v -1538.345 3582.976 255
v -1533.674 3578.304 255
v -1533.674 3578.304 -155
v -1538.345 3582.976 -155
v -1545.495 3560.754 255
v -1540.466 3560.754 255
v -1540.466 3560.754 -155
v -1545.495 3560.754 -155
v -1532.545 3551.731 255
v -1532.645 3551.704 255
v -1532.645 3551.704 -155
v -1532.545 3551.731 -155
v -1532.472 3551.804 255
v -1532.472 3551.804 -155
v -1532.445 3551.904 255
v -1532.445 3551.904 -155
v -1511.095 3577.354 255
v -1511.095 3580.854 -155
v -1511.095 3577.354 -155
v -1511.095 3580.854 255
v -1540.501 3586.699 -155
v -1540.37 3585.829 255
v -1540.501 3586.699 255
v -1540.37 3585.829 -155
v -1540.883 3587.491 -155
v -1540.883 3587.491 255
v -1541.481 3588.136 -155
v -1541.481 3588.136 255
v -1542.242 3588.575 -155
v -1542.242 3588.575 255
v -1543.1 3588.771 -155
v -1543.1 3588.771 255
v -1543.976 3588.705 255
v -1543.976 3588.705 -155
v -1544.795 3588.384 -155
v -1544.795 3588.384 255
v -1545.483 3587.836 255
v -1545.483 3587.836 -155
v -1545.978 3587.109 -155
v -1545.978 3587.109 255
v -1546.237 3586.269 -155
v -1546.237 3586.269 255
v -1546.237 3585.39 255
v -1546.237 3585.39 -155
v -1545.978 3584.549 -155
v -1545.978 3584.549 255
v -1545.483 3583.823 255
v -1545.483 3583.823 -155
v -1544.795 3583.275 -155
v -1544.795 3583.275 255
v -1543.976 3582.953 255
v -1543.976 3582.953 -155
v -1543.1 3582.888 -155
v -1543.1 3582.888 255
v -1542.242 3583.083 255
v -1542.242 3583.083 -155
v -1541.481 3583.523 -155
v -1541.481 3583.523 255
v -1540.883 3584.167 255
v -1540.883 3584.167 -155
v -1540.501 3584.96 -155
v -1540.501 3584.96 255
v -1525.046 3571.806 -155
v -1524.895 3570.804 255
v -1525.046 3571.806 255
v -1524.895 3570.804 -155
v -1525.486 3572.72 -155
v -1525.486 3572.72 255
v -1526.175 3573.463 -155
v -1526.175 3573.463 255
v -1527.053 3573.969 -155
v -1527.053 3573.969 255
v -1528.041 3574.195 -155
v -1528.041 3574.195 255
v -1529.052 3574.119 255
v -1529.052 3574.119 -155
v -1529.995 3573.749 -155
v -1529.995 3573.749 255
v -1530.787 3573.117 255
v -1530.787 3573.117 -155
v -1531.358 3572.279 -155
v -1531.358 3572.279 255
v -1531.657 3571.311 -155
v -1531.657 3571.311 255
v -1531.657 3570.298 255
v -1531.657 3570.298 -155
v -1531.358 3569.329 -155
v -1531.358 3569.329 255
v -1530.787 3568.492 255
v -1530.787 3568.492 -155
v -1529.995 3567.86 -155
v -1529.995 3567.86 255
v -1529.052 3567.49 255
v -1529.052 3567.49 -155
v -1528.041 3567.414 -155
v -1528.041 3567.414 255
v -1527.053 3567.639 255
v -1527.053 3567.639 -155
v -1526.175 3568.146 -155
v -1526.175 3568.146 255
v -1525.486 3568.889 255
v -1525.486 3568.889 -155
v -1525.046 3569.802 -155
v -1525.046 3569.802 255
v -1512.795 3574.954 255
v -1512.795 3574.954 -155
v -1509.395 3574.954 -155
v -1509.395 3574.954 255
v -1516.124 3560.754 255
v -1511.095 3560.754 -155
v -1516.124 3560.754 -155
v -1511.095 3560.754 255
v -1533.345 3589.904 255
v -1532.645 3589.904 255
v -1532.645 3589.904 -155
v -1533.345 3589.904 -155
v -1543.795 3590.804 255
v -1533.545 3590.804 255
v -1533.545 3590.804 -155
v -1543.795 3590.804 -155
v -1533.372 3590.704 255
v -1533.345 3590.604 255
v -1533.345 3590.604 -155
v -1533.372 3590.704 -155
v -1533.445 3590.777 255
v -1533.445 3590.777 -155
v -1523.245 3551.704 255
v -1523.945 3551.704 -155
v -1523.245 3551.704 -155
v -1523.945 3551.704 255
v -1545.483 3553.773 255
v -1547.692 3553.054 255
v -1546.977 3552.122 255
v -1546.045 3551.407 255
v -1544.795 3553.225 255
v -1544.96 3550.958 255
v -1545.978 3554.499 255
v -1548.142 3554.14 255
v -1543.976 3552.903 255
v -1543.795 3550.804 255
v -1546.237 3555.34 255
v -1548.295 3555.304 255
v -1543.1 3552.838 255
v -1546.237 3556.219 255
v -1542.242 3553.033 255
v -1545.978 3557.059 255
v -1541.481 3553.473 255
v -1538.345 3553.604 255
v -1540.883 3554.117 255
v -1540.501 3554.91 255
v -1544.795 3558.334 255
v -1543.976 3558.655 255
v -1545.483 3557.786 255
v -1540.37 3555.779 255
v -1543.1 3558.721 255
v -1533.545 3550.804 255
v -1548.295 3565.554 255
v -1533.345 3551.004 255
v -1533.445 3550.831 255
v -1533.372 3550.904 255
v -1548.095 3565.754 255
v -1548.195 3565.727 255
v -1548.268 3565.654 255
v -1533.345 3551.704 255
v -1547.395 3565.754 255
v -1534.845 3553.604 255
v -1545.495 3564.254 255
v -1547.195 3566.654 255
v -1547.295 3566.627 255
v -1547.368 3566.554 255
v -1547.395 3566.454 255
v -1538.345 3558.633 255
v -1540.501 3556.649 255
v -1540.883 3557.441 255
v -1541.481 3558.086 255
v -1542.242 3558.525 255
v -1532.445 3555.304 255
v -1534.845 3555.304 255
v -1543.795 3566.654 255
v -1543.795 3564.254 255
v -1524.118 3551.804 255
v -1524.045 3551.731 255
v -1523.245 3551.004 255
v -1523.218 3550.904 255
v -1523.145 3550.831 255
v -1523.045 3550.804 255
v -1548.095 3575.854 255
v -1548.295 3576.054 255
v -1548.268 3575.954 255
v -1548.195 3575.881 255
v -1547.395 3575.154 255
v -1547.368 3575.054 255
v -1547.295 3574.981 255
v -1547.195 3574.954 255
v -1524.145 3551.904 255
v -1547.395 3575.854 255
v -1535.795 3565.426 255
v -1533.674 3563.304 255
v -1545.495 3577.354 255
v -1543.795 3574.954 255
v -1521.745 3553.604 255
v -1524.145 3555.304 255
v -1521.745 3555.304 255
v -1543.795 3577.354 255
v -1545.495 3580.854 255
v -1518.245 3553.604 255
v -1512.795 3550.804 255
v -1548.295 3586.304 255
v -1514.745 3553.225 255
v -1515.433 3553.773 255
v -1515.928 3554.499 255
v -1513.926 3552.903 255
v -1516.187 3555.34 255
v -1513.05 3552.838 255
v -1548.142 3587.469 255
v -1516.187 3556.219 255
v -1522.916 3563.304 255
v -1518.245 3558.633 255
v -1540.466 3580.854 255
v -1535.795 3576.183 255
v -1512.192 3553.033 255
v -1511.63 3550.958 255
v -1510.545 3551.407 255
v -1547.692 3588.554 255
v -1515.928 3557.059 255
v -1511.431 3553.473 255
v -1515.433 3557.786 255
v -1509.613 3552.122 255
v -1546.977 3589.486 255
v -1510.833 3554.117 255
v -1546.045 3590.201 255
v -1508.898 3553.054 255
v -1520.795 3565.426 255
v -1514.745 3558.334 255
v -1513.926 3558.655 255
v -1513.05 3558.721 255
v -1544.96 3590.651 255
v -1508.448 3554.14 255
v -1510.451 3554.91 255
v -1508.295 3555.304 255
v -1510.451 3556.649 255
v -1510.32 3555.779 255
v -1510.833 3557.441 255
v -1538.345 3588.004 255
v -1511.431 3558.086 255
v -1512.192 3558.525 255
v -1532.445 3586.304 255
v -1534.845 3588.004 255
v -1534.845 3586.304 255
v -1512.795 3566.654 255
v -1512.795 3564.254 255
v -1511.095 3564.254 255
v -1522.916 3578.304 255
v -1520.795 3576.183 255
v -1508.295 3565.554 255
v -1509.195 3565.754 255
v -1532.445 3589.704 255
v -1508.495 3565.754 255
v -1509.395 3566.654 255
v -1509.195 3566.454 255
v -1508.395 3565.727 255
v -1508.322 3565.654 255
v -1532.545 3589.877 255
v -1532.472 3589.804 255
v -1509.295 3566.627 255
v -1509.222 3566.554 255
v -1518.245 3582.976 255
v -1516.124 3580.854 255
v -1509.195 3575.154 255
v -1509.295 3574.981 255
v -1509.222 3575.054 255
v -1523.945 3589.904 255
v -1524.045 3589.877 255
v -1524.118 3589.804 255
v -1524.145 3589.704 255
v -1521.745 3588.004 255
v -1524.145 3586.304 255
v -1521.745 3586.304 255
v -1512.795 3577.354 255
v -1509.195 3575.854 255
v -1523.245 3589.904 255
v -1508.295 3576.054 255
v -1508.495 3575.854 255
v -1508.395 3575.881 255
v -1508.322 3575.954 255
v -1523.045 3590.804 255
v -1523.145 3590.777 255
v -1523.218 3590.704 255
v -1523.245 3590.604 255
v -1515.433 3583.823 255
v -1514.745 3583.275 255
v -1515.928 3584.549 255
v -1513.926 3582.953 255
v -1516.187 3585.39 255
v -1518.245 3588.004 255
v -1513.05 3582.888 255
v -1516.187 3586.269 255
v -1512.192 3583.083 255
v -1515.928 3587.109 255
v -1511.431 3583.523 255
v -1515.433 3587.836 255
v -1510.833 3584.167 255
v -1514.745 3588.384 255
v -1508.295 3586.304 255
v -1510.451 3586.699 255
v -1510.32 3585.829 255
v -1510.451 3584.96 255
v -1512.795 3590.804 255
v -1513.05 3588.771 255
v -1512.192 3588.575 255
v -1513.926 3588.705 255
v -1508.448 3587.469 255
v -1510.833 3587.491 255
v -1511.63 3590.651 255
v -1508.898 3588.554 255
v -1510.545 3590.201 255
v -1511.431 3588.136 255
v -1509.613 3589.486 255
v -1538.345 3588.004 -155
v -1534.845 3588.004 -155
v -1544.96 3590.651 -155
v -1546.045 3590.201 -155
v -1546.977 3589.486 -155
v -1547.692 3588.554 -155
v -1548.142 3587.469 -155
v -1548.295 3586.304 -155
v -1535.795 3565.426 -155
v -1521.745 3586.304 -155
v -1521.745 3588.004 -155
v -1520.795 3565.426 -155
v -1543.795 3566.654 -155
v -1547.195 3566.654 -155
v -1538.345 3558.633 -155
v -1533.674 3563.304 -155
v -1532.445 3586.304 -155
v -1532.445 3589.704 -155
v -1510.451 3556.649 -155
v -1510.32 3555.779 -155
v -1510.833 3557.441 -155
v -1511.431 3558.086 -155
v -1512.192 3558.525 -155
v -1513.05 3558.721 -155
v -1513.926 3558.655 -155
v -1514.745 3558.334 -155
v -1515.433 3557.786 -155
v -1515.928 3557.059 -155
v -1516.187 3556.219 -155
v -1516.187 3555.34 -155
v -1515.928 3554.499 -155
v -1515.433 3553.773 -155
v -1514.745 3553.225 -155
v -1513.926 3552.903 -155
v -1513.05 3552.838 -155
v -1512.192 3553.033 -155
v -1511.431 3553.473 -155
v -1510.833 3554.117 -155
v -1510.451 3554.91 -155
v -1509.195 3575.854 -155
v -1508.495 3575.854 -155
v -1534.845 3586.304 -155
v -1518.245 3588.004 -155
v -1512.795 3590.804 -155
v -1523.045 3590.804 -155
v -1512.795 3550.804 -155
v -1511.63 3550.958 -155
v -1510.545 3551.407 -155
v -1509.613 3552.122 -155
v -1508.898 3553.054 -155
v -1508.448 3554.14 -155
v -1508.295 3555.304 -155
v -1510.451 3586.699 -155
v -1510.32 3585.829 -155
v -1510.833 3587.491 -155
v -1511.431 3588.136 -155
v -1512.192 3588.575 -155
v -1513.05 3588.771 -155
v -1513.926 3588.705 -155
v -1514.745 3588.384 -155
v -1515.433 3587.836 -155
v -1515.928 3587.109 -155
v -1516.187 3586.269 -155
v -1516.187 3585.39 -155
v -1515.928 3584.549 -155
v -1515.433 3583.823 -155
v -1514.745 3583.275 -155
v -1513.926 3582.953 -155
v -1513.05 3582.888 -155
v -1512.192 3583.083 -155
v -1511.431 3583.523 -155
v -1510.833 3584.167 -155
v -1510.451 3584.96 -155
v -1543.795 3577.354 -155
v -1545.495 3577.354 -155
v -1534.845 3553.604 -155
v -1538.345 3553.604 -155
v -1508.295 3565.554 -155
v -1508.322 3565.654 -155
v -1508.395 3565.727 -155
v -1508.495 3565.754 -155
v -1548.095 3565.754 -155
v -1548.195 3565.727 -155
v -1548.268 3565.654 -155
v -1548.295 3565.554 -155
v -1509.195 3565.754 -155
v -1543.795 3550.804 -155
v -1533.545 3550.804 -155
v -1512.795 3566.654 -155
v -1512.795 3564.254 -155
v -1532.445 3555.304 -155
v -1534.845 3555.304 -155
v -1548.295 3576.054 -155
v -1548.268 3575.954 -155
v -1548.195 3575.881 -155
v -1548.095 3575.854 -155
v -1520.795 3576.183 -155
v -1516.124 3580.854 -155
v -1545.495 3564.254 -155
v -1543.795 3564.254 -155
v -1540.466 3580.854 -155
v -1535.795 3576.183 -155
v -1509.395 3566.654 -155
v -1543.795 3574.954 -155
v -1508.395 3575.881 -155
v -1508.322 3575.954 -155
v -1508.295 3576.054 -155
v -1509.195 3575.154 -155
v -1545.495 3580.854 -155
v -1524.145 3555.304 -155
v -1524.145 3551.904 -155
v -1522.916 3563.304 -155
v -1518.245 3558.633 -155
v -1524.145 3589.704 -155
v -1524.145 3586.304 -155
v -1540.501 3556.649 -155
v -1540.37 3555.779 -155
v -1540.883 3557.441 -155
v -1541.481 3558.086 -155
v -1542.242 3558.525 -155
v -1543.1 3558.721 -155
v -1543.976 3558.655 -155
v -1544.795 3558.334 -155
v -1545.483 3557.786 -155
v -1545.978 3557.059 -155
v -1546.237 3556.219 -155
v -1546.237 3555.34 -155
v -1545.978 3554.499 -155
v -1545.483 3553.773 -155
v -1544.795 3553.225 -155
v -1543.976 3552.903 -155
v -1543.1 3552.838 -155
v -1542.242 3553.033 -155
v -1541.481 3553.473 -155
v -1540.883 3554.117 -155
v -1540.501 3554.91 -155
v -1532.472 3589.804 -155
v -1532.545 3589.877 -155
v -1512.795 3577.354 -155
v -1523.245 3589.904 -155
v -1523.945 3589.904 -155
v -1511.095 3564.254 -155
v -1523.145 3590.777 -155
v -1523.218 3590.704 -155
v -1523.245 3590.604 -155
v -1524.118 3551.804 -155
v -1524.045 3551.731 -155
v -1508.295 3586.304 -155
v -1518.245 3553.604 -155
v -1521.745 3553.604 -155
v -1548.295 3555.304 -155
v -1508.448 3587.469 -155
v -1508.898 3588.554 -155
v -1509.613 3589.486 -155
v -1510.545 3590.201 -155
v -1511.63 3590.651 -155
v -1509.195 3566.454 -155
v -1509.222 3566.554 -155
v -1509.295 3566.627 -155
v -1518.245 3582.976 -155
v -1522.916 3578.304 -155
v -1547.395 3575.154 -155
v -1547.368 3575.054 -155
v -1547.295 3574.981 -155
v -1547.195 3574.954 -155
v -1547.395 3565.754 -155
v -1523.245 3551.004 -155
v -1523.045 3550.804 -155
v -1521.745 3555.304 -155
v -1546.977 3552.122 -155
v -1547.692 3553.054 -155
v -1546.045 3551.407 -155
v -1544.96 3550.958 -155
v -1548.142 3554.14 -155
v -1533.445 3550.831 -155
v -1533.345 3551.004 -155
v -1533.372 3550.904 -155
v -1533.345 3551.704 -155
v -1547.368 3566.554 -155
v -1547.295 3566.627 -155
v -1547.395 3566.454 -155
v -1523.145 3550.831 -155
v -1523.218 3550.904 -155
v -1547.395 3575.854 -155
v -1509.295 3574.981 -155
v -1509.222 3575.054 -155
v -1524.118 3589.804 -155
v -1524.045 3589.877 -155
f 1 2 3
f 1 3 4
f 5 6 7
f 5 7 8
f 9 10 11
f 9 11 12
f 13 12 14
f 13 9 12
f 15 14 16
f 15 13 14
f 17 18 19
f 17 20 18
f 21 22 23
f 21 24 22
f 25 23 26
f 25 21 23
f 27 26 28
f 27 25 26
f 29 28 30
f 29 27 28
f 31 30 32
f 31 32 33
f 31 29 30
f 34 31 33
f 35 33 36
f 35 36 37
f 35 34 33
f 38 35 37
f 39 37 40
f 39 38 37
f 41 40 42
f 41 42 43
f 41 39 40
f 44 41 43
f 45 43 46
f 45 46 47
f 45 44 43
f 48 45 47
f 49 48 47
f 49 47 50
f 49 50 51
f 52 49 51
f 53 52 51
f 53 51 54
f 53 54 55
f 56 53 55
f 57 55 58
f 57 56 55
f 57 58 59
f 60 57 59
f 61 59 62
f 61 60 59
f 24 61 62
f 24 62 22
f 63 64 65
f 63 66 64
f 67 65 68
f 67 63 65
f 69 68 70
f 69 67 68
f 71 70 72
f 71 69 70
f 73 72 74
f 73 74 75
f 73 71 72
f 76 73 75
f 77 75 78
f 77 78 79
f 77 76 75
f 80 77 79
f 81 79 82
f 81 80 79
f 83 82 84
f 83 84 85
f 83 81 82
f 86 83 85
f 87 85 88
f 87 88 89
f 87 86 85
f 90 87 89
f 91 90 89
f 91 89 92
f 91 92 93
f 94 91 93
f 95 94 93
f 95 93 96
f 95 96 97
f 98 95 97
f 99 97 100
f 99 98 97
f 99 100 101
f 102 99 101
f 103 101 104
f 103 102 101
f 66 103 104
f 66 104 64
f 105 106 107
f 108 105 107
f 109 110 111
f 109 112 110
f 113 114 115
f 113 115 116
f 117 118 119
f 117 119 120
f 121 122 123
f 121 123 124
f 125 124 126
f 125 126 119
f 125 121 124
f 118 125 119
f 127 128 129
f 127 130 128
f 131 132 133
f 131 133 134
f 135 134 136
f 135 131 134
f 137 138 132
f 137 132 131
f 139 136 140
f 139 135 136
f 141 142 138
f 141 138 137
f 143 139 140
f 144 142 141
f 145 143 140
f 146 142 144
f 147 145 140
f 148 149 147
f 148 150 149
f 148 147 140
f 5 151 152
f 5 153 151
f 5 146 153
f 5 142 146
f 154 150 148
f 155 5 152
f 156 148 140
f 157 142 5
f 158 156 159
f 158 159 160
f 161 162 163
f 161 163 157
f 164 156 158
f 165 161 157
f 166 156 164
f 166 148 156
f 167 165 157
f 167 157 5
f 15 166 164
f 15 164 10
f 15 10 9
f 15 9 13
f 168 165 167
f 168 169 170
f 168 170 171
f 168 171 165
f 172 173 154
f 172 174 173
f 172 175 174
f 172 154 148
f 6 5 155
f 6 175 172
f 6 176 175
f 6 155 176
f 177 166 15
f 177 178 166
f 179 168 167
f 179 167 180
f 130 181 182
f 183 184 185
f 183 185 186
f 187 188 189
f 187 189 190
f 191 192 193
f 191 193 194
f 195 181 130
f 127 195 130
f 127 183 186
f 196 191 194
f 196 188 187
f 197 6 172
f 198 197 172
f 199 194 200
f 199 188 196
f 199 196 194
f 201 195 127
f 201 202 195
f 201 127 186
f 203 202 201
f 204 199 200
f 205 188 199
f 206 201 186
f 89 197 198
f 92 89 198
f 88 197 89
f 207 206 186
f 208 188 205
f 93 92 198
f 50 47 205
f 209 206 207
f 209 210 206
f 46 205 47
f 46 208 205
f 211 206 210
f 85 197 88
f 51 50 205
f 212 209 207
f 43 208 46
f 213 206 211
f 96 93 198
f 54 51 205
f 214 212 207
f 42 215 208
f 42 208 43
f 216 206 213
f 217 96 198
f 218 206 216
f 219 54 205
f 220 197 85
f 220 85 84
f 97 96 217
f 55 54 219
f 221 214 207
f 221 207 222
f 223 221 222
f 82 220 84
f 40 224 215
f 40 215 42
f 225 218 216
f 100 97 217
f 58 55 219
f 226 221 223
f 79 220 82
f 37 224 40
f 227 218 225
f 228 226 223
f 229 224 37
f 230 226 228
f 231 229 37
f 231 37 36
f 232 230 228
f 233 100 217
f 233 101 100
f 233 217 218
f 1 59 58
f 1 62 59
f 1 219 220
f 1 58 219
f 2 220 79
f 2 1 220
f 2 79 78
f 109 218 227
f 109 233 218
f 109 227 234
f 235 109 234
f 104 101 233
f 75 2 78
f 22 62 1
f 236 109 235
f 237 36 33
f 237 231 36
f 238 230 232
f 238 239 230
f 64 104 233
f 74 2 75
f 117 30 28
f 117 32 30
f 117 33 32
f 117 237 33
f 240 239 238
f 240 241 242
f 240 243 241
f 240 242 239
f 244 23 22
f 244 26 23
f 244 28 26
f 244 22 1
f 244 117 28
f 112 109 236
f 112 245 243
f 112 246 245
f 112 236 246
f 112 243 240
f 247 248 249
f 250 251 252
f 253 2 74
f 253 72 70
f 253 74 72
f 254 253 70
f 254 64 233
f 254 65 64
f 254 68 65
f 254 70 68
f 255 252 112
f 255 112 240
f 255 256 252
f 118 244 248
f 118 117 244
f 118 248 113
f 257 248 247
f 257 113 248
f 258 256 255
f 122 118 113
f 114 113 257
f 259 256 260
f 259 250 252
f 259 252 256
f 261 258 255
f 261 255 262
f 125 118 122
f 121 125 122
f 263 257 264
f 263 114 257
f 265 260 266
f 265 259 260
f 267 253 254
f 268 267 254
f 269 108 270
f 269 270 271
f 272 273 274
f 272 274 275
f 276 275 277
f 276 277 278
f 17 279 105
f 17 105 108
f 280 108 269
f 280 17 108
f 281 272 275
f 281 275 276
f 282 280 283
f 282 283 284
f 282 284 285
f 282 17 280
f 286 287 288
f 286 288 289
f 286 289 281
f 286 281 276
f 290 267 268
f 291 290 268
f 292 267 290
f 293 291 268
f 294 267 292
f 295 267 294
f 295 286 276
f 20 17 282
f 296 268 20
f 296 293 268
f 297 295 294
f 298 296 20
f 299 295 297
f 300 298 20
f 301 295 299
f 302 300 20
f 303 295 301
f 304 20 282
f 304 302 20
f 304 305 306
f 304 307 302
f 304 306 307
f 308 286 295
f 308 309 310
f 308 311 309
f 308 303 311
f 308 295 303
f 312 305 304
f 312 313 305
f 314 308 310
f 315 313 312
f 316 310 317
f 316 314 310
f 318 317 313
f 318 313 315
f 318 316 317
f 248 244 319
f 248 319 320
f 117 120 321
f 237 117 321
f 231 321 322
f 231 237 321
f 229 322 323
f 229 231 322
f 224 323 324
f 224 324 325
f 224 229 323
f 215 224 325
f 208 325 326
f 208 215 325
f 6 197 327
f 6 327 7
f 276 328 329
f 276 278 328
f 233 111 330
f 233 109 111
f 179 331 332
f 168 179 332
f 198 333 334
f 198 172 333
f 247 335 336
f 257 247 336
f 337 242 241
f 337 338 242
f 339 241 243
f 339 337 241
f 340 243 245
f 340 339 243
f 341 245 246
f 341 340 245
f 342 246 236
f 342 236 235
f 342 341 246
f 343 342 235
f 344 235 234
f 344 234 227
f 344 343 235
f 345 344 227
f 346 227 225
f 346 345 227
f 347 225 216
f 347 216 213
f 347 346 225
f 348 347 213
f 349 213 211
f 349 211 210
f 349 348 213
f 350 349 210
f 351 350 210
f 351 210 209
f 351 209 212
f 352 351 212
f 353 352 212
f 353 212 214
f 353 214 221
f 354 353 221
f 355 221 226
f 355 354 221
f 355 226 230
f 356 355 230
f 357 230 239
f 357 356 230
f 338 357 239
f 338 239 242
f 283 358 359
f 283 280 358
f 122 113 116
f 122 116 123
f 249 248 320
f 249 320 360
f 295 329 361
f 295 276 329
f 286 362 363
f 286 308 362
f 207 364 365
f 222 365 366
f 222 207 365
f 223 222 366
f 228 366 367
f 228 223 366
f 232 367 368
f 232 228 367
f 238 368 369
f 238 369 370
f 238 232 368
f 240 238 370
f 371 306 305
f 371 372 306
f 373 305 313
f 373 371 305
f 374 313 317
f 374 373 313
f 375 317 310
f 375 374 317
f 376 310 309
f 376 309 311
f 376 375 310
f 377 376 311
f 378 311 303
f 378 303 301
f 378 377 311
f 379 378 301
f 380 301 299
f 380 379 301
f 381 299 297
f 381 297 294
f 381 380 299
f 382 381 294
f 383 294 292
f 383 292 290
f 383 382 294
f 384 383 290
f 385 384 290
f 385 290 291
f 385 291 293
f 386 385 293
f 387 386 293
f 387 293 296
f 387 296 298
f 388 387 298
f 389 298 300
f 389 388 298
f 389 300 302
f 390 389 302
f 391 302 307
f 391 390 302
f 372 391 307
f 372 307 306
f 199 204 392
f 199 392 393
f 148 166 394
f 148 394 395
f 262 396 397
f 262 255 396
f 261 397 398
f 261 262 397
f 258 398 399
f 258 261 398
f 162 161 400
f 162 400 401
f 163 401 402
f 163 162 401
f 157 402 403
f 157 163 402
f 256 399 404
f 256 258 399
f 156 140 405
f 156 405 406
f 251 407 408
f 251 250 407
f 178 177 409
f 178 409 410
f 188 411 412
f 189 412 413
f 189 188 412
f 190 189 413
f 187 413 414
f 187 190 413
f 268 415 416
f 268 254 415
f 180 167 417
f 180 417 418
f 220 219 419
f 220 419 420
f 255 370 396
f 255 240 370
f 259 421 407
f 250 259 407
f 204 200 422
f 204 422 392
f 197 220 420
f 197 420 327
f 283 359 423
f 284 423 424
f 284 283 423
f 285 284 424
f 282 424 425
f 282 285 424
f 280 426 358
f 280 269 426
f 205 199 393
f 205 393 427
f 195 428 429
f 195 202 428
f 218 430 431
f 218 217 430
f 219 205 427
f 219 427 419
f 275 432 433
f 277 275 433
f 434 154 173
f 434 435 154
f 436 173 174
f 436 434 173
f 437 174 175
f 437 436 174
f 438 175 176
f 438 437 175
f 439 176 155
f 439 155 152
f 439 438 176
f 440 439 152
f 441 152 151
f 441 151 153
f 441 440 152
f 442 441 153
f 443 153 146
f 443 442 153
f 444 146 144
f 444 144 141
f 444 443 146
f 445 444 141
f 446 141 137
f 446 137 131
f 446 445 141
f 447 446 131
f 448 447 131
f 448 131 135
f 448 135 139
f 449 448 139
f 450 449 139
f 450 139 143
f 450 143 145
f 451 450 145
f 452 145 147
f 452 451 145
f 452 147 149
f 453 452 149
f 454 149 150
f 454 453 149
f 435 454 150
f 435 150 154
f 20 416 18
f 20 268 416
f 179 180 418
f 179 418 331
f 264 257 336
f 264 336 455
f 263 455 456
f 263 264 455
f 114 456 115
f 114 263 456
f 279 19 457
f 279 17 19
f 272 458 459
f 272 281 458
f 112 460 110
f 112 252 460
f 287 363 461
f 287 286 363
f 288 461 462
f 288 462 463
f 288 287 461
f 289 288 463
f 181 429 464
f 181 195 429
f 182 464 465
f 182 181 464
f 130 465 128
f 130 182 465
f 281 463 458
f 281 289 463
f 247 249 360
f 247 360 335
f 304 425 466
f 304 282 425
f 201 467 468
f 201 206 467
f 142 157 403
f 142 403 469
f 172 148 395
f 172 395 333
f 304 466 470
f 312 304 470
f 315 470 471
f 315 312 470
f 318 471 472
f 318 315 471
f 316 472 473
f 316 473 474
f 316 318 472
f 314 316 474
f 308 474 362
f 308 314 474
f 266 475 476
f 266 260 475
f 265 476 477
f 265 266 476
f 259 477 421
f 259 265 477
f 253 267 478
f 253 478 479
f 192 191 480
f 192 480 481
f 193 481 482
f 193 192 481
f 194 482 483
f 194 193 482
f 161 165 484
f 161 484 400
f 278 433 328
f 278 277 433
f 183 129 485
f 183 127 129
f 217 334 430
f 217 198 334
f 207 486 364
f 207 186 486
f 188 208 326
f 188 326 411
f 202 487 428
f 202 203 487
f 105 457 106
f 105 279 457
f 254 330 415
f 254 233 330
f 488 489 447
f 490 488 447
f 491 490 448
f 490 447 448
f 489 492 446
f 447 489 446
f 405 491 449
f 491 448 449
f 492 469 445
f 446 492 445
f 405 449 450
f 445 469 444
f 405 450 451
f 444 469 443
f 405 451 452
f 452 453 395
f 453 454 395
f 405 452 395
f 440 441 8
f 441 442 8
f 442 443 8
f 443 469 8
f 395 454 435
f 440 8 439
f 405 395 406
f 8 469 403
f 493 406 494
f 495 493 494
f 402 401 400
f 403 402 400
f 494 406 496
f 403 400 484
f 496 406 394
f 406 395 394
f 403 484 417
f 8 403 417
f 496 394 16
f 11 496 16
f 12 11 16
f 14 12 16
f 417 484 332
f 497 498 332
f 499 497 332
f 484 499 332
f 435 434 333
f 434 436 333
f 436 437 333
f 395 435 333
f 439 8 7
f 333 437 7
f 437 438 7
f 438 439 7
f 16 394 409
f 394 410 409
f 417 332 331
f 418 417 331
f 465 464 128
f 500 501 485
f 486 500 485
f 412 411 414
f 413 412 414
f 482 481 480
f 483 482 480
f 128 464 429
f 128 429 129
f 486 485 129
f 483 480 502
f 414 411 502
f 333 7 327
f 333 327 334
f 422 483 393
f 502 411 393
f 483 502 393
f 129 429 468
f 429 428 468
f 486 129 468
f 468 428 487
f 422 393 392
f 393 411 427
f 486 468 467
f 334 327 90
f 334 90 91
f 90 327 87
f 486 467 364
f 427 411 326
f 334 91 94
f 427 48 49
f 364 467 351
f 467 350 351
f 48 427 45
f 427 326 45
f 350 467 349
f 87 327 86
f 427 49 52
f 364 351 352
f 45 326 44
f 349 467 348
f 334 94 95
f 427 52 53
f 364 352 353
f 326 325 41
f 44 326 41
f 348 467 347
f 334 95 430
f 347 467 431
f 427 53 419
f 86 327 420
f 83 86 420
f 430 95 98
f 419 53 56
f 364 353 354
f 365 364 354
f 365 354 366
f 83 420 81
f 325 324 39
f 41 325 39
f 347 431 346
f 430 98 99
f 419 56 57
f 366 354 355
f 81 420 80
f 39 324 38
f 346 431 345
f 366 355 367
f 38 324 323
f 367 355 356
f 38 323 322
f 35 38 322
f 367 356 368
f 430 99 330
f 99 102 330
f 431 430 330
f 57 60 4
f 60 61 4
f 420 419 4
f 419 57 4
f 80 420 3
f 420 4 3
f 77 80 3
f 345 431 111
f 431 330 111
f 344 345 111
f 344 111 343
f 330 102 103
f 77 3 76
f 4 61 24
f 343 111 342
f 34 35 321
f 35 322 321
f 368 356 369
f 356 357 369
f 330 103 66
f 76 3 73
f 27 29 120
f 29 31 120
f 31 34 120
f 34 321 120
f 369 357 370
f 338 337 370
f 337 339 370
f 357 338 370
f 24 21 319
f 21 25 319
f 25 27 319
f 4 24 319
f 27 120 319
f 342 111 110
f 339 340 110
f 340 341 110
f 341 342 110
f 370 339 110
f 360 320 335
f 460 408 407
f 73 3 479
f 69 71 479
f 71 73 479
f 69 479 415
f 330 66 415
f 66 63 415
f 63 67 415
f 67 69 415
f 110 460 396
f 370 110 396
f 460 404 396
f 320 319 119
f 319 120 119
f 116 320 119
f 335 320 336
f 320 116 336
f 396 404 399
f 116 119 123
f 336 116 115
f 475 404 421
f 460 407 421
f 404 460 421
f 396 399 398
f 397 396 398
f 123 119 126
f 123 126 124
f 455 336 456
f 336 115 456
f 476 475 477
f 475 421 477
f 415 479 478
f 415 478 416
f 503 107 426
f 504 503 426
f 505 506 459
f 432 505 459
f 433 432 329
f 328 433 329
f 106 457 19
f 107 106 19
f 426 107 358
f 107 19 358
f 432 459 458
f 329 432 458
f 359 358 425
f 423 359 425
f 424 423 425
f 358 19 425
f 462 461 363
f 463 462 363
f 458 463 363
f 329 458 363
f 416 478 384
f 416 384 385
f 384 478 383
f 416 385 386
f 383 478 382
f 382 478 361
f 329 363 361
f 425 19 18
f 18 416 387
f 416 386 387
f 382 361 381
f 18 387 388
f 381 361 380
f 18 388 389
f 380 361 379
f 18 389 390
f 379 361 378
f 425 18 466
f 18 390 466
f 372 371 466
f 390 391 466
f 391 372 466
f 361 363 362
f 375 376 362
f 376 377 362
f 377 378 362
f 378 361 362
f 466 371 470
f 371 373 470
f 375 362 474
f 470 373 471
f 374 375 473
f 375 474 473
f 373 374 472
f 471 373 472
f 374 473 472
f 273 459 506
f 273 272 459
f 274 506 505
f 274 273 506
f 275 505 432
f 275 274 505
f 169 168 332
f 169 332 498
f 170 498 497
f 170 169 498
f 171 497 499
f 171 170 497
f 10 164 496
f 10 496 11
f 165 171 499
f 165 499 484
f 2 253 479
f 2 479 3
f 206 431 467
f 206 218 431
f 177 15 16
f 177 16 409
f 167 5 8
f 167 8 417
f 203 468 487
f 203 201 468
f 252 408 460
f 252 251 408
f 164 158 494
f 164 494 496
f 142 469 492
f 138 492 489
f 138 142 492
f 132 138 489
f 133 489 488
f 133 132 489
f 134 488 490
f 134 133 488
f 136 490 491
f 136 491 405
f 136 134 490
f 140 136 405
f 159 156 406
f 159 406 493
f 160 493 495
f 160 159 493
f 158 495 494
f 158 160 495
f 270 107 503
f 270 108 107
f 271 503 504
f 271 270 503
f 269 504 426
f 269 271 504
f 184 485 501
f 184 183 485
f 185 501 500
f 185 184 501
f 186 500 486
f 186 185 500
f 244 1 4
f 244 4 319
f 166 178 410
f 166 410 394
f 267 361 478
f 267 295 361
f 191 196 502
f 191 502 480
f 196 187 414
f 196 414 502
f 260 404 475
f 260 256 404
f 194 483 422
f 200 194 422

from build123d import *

# Parameters (mm, degrees)
SKETCH_1_R      = 2.95
SKETCH_1_R_2    = 3.4
EXTRUDE_1_DEPTH = 205


with BuildPart() as part:
    # 草图1 → 凸台-拉伸1 (new body, symmetric)
    with BuildSketch(Plane.XY.offset(50)):
        with BuildLine():
            Line((-1518.245004392, 3588.004280474), (-1518.245004392, 3582.975600817))
            Line((-1518.245004392, 3582.975600817), (-1522.916324736, 3578.304280474))
            Line((-1522.916324736, 3578.304280474), (-1533.673684048, 3578.304280474))
            Line((-1533.673684048, 3578.304280474), (-1538.345004392, 3582.975600817))
            Line((-1538.345004392, 3582.975600817), (-1538.345004392, 3588.004280474))
            Line((-1538.345004392, 3588.004280474), (-1534.845004392, 3588.004280474))
            Line((-1534.845004392, 3588.004280474), (-1534.845004392, 3586.304280474))
            Line((-1534.845004392, 3586.304280474), (-1532.445004392, 3586.304280474))
            Line((-1532.445004392, 3586.304280474), (-1532.445004392, 3589.704280474))
            ThreePointArc((-1532.445004392, 3589.704280474), (-1532.503583036, 3589.84570183), (-1532.645004392, 3589.904280474))
            Line((-1532.645004392, 3589.904280474), (-1533.345004392, 3589.904280474))
            Line((-1533.345004392, 3589.904280474), (-1533.345004392, 3590.604280474))
            ThreePointArc((-1533.345004392, 3590.604280474), (-1533.403583036, 3590.74570183), (-1533.545004392, 3590.804280474))
            Line((-1533.545004392, 3590.804280474), (-1543.795004392, 3590.804280474))
            ThreePointArc((-1543.795004392, 3590.804280474), (-1546.976984907, 3589.486260989), (-1548.295004392, 3586.304280474))
            Line((-1548.295004392, 3586.304280474), (-1548.295004392, 3576.054280474))
            ThreePointArc((-1548.295004392, 3576.054280474), (-1548.236425748, 3575.912859117), (-1548.095004392, 3575.854280474))
            Line((-1548.095004392, 3575.854280474), (-1547.395004392, 3575.854280474))
            Line((-1547.395004392, 3575.854280474), (-1547.395004392, 3575.154280474))
            ThreePointArc((-1547.395004392, 3575.154280474), (-1547.336425748, 3575.012859117), (-1547.195004392, 3574.954280474))
            Line((-1547.195004392, 3574.954280474), (-1543.795004392, 3574.954280474))
            Line((-1543.795004392, 3574.954280474), (-1543.795004392, 3577.354280474))
            Line((-1543.795004392, 3577.354280474), (-1545.495004392, 3577.354280474))
            Line((-1545.495004392, 3577.354280474), (-1545.495004392, 3580.854280474))
            Line((-1545.495004392, 3580.854280474), (-1540.466324736, 3580.854280474))
            Line((-1540.466324736, 3580.854280474), (-1535.795004392, 3576.18296013))
            Line((-1535.795004392, 3576.18296013), (-1535.795004392, 3565.425600817))
            Line((-1535.795004392, 3565.425600817), (-1540.466324736, 3560.754280474))
            Line((-1540.466324736, 3560.754280474), (-1545.495004392, 3560.754280474))
            Line((-1545.495004392, 3560.754280474), (-1545.495004392, 3564.254280474))
            Line((-1545.495004392, 3564.254280474), (-1543.795004392, 3564.254280474))
            Line((-1543.795004392, 3564.254280474), (-1543.795004392, 3566.654280474))
            Line((-1543.795004392, 3566.654280474), (-1547.195004392, 3566.654280474))
            ThreePointArc((-1547.195004392, 3566.654280474), (-1547.336425748, 3566.59570183), (-1547.395004392, 3566.454280474))
            Line((-1547.395004392, 3566.454280474), (-1547.395004392, 3565.754280474))
            Line((-1547.395004392, 3565.754280474), (-1548.095004392, 3565.754280474))
            ThreePointArc((-1548.095004392, 3565.754280474), (-1548.236425748, 3565.69570183), (-1548.295004392, 3565.554280474))
            Line((-1548.295004392, 3565.554280474), (-1548.295004392, 3555.304280474))
            ThreePointArc((-1548.295004392, 3555.304280474), (-1546.976984907, 3552.122299958), (-1543.795004392, 3550.804280474))
            Line((-1543.795004392, 3550.804280474), (-1533.545004392, 3550.804280474))
            ThreePointArc((-1533.545004392, 3550.804280474), (-1533.403583036, 3550.862859117), (-1533.345004392, 3551.004280474))
            Line((-1533.345004392, 3551.004280474), (-1533.345004392, 3551.704280474))
            Line((-1533.345004392, 3551.704280474), (-1532.645004392, 3551.704280474))
            ThreePointArc((-1532.645004392, 3551.704280474), (-1532.503583036, 3551.762859117), (-1532.445004392, 3551.904280474))
            Line((-1532.445004392, 3551.904280474), (-1532.445004392, 3555.304280474))
            Line((-1532.445004392, 3555.304280474), (-1534.845004392, 3555.304280474))
            Line((-1534.845004392, 3555.304280474), (-1534.845004392, 3553.604280474))
            Line((-1534.845004392, 3553.604280474), (-1538.345004392, 3553.604280474))
            Line((-1538.345004392, 3553.604280474), (-1538.345004392, 3558.63296013))
            Line((-1538.345004392, 3558.63296013), (-1533.673684048, 3563.304280474))
            Line((-1533.673684048, 3563.304280474), (-1522.916324736, 3563.304280474))
            Line((-1522.916324736, 3563.304280474), (-1518.245004392, 3558.63296013))
            Line((-1518.245004392, 3558.63296013), (-1518.245004392, 3553.604280474))
            Line((-1518.245004392, 3553.604280474), (-1521.745004392, 3553.604280474))
            Line((-1521.745004392, 3553.604280474), (-1521.745004392, 3555.304280474))
            Line((-1521.745004392, 3555.304280474), (-1524.145004392, 3555.304280474))
            Line((-1524.145004392, 3555.304280474), (-1524.145004392, 3551.904280474))
            ThreePointArc((-1524.145004392, 3551.904280474), (-1524.086425748, 3551.762859117), (-1523.945004392, 3551.704280474))
            Line((-1523.945004392, 3551.704280474), (-1523.245004392, 3551.704280474))
            Line((-1523.245004392, 3551.704280474), (-1523.245004392, 3551.004280474))
            ThreePointArc((-1523.245004392, 3551.004280474), (-1523.186425748, 3550.862859117), (-1523.045004392, 3550.804280474))
            Line((-1523.045004392, 3550.804280474), (-1512.795004392, 3550.804280474))
            ThreePointArc((-1512.795004392, 3550.804280474), (-1509.613023877, 3552.122299958), (-1508.295004392, 3555.304280474))
            Line((-1508.295004392, 3555.304280474), (-1508.295004392, 3565.554280474))
            ThreePointArc((-1508.295004392, 3565.554280474), (-1508.353583036, 3565.69570183), (-1508.495004392, 3565.754280474))
            Line((-1508.495004392, 3565.754280474), (-1509.195004392, 3565.754280474))
            Line((-1509.195004392, 3565.754280474), (-1509.195004392, 3566.454280474))
            ThreePointArc((-1509.195004392, 3566.454280474), (-1509.253583036, 3566.59570183), (-1509.395004392, 3566.654280474))
            Line((-1509.395004392, 3566.654280474), (-1512.795004392, 3566.654280474))
            Line((-1512.795004392, 3566.654280474), (-1512.795004392, 3564.254280474))
            Line((-1512.795004392, 3564.254280474), (-1511.095004392, 3564.254280474))
            Line((-1511.095004392, 3564.254280474), (-1511.095004392, 3560.754280474))
            Line((-1511.095004392, 3560.754280474), (-1516.123684048, 3560.754280474))
            Line((-1516.123684048, 3560.754280474), (-1520.795004392, 3565.425600817))
            Line((-1520.795004392, 3565.425600817), (-1520.795004392, 3576.18296013))
            Line((-1520.795004392, 3576.18296013), (-1516.123684048, 3580.854280474))
            Line((-1516.123684048, 3580.854280474), (-1511.095004392, 3580.854280474))
            Line((-1511.095004392, 3580.854280474), (-1511.095004392, 3577.354280474))
            Line((-1511.095004392, 3577.354280474), (-1512.795004392, 3577.354280474))
            Line((-1512.795004392, 3577.354280474), (-1512.795004392, 3574.954280474))
            Line((-1512.795004392, 3574.954280474), (-1509.395004392, 3574.954280474))
            ThreePointArc((-1509.395004392, 3574.954280474), (-1509.253583036, 3575.012859117), (-1509.195004392, 3575.154280474))
            Line((-1509.195004392, 3575.154280474), (-1509.195004392, 3575.854280474))
            Line((-1509.195004392, 3575.854280474), (-1508.495004392, 3575.854280474))
            ThreePointArc((-1508.495004392, 3575.854280474), (-1508.353583036, 3575.912859117), (-1508.295004392, 3576.054280474))
            Line((-1508.295004392, 3576.054280474), (-1508.295004392, 3586.304280474))
            ThreePointArc((-1508.295004392, 3586.304280474), (-1509.613023877, 3589.486260989), (-1512.795004392, 3590.804280474))
            Line((-1512.795004392, 3590.804280474), (-1523.045004392, 3590.804280474))
            ThreePointArc((-1523.045004392, 3590.804280474), (-1523.186425748, 3590.74570183), (-1523.245004392, 3590.604280474))
            Line((-1523.245004392, 3590.604280474), (-1523.245004392, 3589.904280474))
            Line((-1523.245004392, 3589.904280474), (-1523.945004392, 3589.904280474))
            ThreePointArc((-1523.945004392, 3589.904280474), (-1524.086425748, 3589.84570183), (-1524.145004392, 3589.704280474))
            Line((-1524.145004392, 3589.704280474), (-1524.145004392, 3586.304280474))
            Line((-1524.145004392, 3586.304280474), (-1521.745004392, 3586.304280474))
            Line((-1521.745004392, 3586.304280474), (-1521.745004392, 3588.004280474))
            Line((-1521.745004392, 3588.004280474), (-1518.245004392, 3588.004280474))
        make_face()
        with Locations((-1513.270004392, 3555.779280474)):
            Circle(SKETCH_1_R, mode=Mode.SUBTRACT)
        with Locations((-1528.295004392, 3570.804280474)):
            Circle(SKETCH_1_R_2, mode=Mode.SUBTRACT)
        with Locations((-1513.270004392, 3585.829280474)):
            Circle(SKETCH_1_R, mode=Mode.SUBTRACT)
        with Locations((-1543.320004392, 3585.829280474)):
            Circle(SKETCH_1_R, mode=Mode.SUBTRACT)
        with Locations((-1543.320004392, 3555.779280474)):
            Circle(SKETCH_1_R, mode=Mode.SUBTRACT)
    extrude(amount=EXTRUDE_1_DEPTH, both=True)


solid = part.part
